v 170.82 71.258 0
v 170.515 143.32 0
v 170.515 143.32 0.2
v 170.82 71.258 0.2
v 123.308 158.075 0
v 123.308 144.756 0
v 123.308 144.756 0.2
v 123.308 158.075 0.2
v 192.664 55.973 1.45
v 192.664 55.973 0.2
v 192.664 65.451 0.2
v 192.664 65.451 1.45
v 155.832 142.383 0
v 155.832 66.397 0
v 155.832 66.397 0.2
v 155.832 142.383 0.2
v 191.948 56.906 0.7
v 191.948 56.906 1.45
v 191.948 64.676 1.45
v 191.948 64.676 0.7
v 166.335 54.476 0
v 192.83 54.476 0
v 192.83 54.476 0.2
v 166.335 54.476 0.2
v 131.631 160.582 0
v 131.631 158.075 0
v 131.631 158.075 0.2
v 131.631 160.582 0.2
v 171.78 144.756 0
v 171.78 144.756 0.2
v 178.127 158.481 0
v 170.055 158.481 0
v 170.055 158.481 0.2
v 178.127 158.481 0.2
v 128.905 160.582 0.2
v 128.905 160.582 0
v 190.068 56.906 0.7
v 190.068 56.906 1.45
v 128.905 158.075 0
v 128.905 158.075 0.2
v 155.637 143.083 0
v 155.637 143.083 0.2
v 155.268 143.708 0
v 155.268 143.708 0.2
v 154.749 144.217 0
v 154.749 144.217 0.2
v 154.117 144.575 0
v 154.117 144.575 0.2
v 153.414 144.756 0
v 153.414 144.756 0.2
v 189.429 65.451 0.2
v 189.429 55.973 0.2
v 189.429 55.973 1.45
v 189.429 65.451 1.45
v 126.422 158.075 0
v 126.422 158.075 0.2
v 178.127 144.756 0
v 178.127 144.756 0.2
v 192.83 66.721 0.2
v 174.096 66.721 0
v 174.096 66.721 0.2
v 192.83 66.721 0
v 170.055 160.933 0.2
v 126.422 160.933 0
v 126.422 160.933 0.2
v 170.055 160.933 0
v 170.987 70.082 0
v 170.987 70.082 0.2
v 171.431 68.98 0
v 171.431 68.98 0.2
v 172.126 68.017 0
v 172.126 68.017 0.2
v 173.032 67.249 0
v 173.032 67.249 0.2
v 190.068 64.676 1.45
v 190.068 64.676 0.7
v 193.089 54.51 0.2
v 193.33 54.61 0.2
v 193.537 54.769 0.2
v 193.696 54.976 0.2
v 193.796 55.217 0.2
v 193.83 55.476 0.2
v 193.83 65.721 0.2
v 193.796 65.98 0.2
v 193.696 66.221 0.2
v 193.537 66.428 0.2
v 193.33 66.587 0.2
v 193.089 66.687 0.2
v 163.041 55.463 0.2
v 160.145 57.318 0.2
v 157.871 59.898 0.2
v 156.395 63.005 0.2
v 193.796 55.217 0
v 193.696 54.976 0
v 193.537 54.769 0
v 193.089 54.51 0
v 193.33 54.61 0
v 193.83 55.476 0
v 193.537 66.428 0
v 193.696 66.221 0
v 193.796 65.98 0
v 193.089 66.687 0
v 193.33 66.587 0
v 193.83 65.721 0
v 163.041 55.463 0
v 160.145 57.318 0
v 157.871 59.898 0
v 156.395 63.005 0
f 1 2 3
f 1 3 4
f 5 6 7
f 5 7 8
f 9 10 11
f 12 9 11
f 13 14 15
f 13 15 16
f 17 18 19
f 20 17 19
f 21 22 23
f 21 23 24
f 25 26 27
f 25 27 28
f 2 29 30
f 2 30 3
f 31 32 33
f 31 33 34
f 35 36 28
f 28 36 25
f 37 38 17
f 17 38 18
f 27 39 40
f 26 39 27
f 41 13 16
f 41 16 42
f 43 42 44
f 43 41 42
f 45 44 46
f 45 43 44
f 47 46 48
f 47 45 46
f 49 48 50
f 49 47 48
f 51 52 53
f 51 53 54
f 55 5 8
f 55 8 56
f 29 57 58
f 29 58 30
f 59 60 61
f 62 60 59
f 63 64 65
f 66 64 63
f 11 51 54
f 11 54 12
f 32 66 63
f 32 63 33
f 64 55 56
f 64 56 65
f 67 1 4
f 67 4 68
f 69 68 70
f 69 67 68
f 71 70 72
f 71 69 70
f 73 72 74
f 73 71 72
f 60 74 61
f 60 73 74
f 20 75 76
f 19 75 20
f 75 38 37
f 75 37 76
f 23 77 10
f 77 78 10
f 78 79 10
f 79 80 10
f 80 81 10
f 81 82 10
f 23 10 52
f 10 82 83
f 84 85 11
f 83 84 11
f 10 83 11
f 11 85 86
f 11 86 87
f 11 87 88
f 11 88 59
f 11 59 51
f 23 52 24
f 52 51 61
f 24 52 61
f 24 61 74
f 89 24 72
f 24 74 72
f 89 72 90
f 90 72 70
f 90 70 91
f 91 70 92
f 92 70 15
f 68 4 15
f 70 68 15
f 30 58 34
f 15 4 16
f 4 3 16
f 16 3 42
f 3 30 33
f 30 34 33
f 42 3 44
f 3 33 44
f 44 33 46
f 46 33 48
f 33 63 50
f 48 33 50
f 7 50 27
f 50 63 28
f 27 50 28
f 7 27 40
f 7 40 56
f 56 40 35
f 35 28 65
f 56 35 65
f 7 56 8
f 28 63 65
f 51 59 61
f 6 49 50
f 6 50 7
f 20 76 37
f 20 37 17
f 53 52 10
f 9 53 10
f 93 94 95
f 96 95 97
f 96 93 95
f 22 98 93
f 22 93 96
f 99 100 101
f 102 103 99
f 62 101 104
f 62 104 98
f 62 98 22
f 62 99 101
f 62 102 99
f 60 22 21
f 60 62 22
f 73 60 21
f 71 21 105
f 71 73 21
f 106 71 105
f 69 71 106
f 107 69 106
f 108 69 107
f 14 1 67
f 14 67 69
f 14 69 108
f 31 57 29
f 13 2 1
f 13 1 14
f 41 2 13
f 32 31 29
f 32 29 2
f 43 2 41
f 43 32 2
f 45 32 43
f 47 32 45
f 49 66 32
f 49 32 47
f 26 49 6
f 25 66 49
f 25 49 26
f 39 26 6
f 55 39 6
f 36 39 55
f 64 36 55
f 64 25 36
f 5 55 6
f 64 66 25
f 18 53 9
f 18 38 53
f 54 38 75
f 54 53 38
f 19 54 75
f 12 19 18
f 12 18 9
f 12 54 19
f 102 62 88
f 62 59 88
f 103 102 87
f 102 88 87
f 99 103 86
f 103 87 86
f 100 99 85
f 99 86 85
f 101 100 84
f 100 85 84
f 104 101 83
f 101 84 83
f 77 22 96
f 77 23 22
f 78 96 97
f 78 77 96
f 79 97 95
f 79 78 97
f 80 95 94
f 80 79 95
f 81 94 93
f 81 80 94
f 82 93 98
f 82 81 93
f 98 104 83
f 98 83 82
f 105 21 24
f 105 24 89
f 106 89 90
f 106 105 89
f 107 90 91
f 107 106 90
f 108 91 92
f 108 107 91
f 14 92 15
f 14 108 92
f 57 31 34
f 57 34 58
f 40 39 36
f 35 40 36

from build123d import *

# Parameters (mm, degrees)
ESQUISSE1_W             = 2.725699057
ESQUISSE1_H             = 2.506306443
BOSS_EXTRU_1_DEPTH      = 0.2
ESQUISSE2_W             = 3.234923292
ESQUISSE2_H             = 9.478551462
BOSS_EXTRU_2_DEPTH      = 1.25
ESQUISSE3_W             = 1.880186225
ESQUISSE3_H             = 7.770248285
ENL_V_MAT_EXTRU_1_DEPTH = 0.75
CONG_1_R                = 1


with BuildPart() as part:
    # Esquisse1 → Boss.-Extru.1 (new body)
    with BuildSketch(Plane.XY):
        with BuildLine():
            Line((126.422039537, 160.93295612), (170.054893457, 160.93295612))
            Line((170.054893457, 160.93295612), (170.054893457, 158.48132271))
            Line((170.054893457, 158.48132271), (178.126916218, 158.48132271))
            Line((178.126916218, 158.48132271), (178.126916218, 144.756393673))
            Line((178.126916218, 144.756393673), (171.779679926, 144.756393673))
            Line((171.779679926, 144.756393673), (170.514624307, 143.320028439))
            Line((170.514624307, 143.320028439), (170.819971895, 71.257993621))
            ThreePointArc((170.819971895, 71.257993621), (171.74909254, 68.47783045), (174.09562451, 66.721026494))
            Line((174.09562451, 66.721026494), (193.829857273, 66.721026494))
            Line((193.829857273, 66.721026494), (193.829857273, 54.476275086))
            Line((193.829857273, 54.476275086), (166.335216501, 54.476275086))
            ThreePointArc((166.335216501, 54.476275086), (158.91775161, 58.528592216), (155.831660909, 66.397270867))
            Line((155.831660909, 66.397270867), (155.831660909, 142.383251424))
            ThreePointArc((155.831660909, 142.383251424), (155.025193292, 143.979631476), (153.414150222, 144.756393673))
            Line((153.414150222, 144.756393673), (123.308343674, 144.756393673))
            Line((123.308343674, 144.756393673), (123.308343674, 158.075350221))
            Line((123.308343674, 158.075350221), (126.422039537, 158.075350221))
            Line((126.422039537, 158.075350221), (126.422039537, 160.93295612))
        make_face()
        with Locations((130.26793419, 159.328503442)):
            Rectangle(ESQUISSE1_W, ESQUISSE1_H, mode=Mode.SUBTRACT)
    extrude(amount=BOSS_EXTRU_1_DEPTH)

    # Esquisse2 → Boss.-Extru.2 (add)
    with BuildSketch(Plane.XY.offset(0.2)):
        with Locations((191.04638423, 60.711911726)):
            Rectangle(ESQUISSE2_W, ESQUISSE2_H)
    extrude(amount=BOSS_EXTRU_2_DEPTH)

    # Esquisse3 → Enlèv. mat.-Extru.1 (cut)
    with BuildSketch(Plane.XY.offset(1.45)):
        with Locations((191.008183709, 60.791242391)):
            Rectangle(ESQUISSE3_W, ESQUISSE3_H)
    extrude(amount=-ENL_V_MAT_EXTRU_1_DEPTH, mode=Mode.SUBTRACT)

    # Congé1
    cong_1_edges = [part.edges().sort_by_distance(p)[0] for p in [
        (193.829857273, 66.721026494, 0.1),
        (193.829857273, 54.476275086, 0.1),
    ]]
    fillet(cong_1_edges, radius=CONG_1_R)


solid = part.part
